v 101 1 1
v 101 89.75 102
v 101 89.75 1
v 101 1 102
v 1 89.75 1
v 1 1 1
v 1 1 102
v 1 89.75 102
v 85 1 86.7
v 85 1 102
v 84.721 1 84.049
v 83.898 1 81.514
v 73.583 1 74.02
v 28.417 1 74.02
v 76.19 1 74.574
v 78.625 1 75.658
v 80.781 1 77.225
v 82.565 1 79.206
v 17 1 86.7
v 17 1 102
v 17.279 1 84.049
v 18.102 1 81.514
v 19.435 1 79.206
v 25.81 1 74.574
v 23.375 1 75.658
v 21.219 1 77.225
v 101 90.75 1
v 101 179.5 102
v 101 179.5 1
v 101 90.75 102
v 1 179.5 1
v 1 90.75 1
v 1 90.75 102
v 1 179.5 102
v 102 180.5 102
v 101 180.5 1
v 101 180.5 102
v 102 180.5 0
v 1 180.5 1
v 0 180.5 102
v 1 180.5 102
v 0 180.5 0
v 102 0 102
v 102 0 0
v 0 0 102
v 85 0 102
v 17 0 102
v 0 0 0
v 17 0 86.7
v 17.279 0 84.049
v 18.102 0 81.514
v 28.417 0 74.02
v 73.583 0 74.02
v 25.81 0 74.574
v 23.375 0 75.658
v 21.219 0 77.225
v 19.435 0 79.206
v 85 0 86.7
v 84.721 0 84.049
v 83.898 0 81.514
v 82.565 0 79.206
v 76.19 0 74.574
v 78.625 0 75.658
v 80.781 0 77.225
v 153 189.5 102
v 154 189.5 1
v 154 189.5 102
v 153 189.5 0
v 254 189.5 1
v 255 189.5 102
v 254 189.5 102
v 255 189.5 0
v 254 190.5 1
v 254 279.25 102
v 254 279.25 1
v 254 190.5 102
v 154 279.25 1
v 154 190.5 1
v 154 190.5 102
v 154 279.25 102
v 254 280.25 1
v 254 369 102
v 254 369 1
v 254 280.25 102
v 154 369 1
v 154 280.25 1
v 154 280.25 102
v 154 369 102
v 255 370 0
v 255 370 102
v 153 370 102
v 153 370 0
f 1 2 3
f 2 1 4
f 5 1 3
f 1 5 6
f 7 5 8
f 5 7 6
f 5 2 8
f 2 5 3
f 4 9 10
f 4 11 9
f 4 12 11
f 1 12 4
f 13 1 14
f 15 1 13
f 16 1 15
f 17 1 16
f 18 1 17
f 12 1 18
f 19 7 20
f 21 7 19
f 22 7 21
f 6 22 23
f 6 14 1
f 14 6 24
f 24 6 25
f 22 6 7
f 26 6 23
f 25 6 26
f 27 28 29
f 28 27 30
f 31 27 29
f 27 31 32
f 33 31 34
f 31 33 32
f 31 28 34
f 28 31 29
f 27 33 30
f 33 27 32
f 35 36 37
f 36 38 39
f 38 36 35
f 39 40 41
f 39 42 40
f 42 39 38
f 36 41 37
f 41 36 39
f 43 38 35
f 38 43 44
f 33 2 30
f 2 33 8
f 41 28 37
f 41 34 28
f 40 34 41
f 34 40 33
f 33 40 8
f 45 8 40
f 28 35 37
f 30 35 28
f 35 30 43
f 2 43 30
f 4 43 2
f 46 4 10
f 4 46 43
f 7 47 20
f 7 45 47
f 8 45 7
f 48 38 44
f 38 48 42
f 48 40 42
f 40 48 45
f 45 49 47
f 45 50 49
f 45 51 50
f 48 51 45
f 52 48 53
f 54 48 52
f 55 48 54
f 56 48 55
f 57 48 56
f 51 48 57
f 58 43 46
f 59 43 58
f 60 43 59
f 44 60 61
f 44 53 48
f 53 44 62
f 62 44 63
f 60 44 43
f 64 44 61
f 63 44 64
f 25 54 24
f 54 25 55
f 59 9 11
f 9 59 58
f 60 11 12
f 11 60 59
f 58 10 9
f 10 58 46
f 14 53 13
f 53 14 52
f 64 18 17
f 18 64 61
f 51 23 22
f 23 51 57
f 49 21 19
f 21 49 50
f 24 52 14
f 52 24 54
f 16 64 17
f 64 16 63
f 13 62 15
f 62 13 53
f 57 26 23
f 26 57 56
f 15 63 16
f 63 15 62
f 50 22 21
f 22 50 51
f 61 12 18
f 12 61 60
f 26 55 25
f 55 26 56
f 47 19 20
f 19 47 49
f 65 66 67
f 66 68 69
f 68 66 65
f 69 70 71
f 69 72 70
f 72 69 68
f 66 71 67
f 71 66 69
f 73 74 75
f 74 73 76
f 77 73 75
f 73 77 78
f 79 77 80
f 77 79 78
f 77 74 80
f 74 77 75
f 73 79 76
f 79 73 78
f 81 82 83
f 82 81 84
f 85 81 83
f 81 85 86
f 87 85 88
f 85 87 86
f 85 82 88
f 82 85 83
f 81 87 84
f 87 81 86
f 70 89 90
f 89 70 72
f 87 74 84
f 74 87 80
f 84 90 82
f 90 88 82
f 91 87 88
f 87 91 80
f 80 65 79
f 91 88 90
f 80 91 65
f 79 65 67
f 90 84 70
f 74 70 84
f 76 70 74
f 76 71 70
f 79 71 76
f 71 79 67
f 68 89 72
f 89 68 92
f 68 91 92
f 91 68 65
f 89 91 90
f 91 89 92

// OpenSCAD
wine_rack_depth = 360;
wine_rack_width = 102;
wine_rack_height = 102;



module winerackit(places = 4, wall = 2) {
rendering_fix  = 1;
    difference(){
        cube([wine_rack_width, wine_rack_depth, wine_rack_height]);
        
        d = (wine_rack_depth - wall - wall - ((places - 1) * wall)) / places;
        
        union(){
            for(i = [1:places]) {
                translate([wall, (wall * i ) + (d * (i - 1)), wall])
                    color("red")
                    cube([102 - wall - wall, d, 
                          102 - wall + rendering_fix]);
            }
        }
            
        // cutout for human hands
        translate([0, rendering_fix, 0]) hull() {
        z = wine_rack_width / 1.5;
        translate([(wine_rack_width - z) / 2, -wall, wine_rack_height * 0.85])
        color("blue")
        cube([z, wall * 2, wine_rack_height / 4]);
        translate([(wine_rack_width - z) / 2 + wine_rack_height / 8,
            wall,
            wine_rack_height * 0.85
        ])
        color("blue")
        rotate([90, 0, 0])
        cylinder(h = wall * 2, d = wine_rack_height / 4);

        translate([wine_rack_width - ((wine_rack_width - z) / 2 + wine_rack_height / 8),
            wall,
            wine_rack_height * 0.85
        ])
        color("green")
        rotate([90, 0, 0])
        cylinder(h = wall * 2, d = wine_rack_height / 4);
        }


    }

}

module split_winerackit(places = 4, wall=2){
    
    d = (wine_rack_depth - wall - wall - ((places - 1) * wall)) / places;
    echo(d);
    
    places_a = floor(places / 2);
    places_b = places - places_a;
    
    echo(places_a, places_b);
    first_half_depth = (wall * (places_a + 1)) + (d * (places_a ));
    second_half_depth = (wall * (places_b + 1)) + (d * (places_b ));
    
    color("red") intersection() {
        cube(first_half_depth);
        winerackit(places=places, wall=wall);
    }
    
    translate([wine_rack_width * 1.5,10,0]) color("white") intersection() {
        translate([0, first_half_depth-  wall, 0]) cube(second_half_depth + wall);
        winerackit(places=places, wall=wall);
    }
}


split_winerackit(places=4, wall=1);


// boxes - inner thingies 
// 1 - 0
// 2 - 1
// 3 - 2
// subtract (n-1) * width of divider.
